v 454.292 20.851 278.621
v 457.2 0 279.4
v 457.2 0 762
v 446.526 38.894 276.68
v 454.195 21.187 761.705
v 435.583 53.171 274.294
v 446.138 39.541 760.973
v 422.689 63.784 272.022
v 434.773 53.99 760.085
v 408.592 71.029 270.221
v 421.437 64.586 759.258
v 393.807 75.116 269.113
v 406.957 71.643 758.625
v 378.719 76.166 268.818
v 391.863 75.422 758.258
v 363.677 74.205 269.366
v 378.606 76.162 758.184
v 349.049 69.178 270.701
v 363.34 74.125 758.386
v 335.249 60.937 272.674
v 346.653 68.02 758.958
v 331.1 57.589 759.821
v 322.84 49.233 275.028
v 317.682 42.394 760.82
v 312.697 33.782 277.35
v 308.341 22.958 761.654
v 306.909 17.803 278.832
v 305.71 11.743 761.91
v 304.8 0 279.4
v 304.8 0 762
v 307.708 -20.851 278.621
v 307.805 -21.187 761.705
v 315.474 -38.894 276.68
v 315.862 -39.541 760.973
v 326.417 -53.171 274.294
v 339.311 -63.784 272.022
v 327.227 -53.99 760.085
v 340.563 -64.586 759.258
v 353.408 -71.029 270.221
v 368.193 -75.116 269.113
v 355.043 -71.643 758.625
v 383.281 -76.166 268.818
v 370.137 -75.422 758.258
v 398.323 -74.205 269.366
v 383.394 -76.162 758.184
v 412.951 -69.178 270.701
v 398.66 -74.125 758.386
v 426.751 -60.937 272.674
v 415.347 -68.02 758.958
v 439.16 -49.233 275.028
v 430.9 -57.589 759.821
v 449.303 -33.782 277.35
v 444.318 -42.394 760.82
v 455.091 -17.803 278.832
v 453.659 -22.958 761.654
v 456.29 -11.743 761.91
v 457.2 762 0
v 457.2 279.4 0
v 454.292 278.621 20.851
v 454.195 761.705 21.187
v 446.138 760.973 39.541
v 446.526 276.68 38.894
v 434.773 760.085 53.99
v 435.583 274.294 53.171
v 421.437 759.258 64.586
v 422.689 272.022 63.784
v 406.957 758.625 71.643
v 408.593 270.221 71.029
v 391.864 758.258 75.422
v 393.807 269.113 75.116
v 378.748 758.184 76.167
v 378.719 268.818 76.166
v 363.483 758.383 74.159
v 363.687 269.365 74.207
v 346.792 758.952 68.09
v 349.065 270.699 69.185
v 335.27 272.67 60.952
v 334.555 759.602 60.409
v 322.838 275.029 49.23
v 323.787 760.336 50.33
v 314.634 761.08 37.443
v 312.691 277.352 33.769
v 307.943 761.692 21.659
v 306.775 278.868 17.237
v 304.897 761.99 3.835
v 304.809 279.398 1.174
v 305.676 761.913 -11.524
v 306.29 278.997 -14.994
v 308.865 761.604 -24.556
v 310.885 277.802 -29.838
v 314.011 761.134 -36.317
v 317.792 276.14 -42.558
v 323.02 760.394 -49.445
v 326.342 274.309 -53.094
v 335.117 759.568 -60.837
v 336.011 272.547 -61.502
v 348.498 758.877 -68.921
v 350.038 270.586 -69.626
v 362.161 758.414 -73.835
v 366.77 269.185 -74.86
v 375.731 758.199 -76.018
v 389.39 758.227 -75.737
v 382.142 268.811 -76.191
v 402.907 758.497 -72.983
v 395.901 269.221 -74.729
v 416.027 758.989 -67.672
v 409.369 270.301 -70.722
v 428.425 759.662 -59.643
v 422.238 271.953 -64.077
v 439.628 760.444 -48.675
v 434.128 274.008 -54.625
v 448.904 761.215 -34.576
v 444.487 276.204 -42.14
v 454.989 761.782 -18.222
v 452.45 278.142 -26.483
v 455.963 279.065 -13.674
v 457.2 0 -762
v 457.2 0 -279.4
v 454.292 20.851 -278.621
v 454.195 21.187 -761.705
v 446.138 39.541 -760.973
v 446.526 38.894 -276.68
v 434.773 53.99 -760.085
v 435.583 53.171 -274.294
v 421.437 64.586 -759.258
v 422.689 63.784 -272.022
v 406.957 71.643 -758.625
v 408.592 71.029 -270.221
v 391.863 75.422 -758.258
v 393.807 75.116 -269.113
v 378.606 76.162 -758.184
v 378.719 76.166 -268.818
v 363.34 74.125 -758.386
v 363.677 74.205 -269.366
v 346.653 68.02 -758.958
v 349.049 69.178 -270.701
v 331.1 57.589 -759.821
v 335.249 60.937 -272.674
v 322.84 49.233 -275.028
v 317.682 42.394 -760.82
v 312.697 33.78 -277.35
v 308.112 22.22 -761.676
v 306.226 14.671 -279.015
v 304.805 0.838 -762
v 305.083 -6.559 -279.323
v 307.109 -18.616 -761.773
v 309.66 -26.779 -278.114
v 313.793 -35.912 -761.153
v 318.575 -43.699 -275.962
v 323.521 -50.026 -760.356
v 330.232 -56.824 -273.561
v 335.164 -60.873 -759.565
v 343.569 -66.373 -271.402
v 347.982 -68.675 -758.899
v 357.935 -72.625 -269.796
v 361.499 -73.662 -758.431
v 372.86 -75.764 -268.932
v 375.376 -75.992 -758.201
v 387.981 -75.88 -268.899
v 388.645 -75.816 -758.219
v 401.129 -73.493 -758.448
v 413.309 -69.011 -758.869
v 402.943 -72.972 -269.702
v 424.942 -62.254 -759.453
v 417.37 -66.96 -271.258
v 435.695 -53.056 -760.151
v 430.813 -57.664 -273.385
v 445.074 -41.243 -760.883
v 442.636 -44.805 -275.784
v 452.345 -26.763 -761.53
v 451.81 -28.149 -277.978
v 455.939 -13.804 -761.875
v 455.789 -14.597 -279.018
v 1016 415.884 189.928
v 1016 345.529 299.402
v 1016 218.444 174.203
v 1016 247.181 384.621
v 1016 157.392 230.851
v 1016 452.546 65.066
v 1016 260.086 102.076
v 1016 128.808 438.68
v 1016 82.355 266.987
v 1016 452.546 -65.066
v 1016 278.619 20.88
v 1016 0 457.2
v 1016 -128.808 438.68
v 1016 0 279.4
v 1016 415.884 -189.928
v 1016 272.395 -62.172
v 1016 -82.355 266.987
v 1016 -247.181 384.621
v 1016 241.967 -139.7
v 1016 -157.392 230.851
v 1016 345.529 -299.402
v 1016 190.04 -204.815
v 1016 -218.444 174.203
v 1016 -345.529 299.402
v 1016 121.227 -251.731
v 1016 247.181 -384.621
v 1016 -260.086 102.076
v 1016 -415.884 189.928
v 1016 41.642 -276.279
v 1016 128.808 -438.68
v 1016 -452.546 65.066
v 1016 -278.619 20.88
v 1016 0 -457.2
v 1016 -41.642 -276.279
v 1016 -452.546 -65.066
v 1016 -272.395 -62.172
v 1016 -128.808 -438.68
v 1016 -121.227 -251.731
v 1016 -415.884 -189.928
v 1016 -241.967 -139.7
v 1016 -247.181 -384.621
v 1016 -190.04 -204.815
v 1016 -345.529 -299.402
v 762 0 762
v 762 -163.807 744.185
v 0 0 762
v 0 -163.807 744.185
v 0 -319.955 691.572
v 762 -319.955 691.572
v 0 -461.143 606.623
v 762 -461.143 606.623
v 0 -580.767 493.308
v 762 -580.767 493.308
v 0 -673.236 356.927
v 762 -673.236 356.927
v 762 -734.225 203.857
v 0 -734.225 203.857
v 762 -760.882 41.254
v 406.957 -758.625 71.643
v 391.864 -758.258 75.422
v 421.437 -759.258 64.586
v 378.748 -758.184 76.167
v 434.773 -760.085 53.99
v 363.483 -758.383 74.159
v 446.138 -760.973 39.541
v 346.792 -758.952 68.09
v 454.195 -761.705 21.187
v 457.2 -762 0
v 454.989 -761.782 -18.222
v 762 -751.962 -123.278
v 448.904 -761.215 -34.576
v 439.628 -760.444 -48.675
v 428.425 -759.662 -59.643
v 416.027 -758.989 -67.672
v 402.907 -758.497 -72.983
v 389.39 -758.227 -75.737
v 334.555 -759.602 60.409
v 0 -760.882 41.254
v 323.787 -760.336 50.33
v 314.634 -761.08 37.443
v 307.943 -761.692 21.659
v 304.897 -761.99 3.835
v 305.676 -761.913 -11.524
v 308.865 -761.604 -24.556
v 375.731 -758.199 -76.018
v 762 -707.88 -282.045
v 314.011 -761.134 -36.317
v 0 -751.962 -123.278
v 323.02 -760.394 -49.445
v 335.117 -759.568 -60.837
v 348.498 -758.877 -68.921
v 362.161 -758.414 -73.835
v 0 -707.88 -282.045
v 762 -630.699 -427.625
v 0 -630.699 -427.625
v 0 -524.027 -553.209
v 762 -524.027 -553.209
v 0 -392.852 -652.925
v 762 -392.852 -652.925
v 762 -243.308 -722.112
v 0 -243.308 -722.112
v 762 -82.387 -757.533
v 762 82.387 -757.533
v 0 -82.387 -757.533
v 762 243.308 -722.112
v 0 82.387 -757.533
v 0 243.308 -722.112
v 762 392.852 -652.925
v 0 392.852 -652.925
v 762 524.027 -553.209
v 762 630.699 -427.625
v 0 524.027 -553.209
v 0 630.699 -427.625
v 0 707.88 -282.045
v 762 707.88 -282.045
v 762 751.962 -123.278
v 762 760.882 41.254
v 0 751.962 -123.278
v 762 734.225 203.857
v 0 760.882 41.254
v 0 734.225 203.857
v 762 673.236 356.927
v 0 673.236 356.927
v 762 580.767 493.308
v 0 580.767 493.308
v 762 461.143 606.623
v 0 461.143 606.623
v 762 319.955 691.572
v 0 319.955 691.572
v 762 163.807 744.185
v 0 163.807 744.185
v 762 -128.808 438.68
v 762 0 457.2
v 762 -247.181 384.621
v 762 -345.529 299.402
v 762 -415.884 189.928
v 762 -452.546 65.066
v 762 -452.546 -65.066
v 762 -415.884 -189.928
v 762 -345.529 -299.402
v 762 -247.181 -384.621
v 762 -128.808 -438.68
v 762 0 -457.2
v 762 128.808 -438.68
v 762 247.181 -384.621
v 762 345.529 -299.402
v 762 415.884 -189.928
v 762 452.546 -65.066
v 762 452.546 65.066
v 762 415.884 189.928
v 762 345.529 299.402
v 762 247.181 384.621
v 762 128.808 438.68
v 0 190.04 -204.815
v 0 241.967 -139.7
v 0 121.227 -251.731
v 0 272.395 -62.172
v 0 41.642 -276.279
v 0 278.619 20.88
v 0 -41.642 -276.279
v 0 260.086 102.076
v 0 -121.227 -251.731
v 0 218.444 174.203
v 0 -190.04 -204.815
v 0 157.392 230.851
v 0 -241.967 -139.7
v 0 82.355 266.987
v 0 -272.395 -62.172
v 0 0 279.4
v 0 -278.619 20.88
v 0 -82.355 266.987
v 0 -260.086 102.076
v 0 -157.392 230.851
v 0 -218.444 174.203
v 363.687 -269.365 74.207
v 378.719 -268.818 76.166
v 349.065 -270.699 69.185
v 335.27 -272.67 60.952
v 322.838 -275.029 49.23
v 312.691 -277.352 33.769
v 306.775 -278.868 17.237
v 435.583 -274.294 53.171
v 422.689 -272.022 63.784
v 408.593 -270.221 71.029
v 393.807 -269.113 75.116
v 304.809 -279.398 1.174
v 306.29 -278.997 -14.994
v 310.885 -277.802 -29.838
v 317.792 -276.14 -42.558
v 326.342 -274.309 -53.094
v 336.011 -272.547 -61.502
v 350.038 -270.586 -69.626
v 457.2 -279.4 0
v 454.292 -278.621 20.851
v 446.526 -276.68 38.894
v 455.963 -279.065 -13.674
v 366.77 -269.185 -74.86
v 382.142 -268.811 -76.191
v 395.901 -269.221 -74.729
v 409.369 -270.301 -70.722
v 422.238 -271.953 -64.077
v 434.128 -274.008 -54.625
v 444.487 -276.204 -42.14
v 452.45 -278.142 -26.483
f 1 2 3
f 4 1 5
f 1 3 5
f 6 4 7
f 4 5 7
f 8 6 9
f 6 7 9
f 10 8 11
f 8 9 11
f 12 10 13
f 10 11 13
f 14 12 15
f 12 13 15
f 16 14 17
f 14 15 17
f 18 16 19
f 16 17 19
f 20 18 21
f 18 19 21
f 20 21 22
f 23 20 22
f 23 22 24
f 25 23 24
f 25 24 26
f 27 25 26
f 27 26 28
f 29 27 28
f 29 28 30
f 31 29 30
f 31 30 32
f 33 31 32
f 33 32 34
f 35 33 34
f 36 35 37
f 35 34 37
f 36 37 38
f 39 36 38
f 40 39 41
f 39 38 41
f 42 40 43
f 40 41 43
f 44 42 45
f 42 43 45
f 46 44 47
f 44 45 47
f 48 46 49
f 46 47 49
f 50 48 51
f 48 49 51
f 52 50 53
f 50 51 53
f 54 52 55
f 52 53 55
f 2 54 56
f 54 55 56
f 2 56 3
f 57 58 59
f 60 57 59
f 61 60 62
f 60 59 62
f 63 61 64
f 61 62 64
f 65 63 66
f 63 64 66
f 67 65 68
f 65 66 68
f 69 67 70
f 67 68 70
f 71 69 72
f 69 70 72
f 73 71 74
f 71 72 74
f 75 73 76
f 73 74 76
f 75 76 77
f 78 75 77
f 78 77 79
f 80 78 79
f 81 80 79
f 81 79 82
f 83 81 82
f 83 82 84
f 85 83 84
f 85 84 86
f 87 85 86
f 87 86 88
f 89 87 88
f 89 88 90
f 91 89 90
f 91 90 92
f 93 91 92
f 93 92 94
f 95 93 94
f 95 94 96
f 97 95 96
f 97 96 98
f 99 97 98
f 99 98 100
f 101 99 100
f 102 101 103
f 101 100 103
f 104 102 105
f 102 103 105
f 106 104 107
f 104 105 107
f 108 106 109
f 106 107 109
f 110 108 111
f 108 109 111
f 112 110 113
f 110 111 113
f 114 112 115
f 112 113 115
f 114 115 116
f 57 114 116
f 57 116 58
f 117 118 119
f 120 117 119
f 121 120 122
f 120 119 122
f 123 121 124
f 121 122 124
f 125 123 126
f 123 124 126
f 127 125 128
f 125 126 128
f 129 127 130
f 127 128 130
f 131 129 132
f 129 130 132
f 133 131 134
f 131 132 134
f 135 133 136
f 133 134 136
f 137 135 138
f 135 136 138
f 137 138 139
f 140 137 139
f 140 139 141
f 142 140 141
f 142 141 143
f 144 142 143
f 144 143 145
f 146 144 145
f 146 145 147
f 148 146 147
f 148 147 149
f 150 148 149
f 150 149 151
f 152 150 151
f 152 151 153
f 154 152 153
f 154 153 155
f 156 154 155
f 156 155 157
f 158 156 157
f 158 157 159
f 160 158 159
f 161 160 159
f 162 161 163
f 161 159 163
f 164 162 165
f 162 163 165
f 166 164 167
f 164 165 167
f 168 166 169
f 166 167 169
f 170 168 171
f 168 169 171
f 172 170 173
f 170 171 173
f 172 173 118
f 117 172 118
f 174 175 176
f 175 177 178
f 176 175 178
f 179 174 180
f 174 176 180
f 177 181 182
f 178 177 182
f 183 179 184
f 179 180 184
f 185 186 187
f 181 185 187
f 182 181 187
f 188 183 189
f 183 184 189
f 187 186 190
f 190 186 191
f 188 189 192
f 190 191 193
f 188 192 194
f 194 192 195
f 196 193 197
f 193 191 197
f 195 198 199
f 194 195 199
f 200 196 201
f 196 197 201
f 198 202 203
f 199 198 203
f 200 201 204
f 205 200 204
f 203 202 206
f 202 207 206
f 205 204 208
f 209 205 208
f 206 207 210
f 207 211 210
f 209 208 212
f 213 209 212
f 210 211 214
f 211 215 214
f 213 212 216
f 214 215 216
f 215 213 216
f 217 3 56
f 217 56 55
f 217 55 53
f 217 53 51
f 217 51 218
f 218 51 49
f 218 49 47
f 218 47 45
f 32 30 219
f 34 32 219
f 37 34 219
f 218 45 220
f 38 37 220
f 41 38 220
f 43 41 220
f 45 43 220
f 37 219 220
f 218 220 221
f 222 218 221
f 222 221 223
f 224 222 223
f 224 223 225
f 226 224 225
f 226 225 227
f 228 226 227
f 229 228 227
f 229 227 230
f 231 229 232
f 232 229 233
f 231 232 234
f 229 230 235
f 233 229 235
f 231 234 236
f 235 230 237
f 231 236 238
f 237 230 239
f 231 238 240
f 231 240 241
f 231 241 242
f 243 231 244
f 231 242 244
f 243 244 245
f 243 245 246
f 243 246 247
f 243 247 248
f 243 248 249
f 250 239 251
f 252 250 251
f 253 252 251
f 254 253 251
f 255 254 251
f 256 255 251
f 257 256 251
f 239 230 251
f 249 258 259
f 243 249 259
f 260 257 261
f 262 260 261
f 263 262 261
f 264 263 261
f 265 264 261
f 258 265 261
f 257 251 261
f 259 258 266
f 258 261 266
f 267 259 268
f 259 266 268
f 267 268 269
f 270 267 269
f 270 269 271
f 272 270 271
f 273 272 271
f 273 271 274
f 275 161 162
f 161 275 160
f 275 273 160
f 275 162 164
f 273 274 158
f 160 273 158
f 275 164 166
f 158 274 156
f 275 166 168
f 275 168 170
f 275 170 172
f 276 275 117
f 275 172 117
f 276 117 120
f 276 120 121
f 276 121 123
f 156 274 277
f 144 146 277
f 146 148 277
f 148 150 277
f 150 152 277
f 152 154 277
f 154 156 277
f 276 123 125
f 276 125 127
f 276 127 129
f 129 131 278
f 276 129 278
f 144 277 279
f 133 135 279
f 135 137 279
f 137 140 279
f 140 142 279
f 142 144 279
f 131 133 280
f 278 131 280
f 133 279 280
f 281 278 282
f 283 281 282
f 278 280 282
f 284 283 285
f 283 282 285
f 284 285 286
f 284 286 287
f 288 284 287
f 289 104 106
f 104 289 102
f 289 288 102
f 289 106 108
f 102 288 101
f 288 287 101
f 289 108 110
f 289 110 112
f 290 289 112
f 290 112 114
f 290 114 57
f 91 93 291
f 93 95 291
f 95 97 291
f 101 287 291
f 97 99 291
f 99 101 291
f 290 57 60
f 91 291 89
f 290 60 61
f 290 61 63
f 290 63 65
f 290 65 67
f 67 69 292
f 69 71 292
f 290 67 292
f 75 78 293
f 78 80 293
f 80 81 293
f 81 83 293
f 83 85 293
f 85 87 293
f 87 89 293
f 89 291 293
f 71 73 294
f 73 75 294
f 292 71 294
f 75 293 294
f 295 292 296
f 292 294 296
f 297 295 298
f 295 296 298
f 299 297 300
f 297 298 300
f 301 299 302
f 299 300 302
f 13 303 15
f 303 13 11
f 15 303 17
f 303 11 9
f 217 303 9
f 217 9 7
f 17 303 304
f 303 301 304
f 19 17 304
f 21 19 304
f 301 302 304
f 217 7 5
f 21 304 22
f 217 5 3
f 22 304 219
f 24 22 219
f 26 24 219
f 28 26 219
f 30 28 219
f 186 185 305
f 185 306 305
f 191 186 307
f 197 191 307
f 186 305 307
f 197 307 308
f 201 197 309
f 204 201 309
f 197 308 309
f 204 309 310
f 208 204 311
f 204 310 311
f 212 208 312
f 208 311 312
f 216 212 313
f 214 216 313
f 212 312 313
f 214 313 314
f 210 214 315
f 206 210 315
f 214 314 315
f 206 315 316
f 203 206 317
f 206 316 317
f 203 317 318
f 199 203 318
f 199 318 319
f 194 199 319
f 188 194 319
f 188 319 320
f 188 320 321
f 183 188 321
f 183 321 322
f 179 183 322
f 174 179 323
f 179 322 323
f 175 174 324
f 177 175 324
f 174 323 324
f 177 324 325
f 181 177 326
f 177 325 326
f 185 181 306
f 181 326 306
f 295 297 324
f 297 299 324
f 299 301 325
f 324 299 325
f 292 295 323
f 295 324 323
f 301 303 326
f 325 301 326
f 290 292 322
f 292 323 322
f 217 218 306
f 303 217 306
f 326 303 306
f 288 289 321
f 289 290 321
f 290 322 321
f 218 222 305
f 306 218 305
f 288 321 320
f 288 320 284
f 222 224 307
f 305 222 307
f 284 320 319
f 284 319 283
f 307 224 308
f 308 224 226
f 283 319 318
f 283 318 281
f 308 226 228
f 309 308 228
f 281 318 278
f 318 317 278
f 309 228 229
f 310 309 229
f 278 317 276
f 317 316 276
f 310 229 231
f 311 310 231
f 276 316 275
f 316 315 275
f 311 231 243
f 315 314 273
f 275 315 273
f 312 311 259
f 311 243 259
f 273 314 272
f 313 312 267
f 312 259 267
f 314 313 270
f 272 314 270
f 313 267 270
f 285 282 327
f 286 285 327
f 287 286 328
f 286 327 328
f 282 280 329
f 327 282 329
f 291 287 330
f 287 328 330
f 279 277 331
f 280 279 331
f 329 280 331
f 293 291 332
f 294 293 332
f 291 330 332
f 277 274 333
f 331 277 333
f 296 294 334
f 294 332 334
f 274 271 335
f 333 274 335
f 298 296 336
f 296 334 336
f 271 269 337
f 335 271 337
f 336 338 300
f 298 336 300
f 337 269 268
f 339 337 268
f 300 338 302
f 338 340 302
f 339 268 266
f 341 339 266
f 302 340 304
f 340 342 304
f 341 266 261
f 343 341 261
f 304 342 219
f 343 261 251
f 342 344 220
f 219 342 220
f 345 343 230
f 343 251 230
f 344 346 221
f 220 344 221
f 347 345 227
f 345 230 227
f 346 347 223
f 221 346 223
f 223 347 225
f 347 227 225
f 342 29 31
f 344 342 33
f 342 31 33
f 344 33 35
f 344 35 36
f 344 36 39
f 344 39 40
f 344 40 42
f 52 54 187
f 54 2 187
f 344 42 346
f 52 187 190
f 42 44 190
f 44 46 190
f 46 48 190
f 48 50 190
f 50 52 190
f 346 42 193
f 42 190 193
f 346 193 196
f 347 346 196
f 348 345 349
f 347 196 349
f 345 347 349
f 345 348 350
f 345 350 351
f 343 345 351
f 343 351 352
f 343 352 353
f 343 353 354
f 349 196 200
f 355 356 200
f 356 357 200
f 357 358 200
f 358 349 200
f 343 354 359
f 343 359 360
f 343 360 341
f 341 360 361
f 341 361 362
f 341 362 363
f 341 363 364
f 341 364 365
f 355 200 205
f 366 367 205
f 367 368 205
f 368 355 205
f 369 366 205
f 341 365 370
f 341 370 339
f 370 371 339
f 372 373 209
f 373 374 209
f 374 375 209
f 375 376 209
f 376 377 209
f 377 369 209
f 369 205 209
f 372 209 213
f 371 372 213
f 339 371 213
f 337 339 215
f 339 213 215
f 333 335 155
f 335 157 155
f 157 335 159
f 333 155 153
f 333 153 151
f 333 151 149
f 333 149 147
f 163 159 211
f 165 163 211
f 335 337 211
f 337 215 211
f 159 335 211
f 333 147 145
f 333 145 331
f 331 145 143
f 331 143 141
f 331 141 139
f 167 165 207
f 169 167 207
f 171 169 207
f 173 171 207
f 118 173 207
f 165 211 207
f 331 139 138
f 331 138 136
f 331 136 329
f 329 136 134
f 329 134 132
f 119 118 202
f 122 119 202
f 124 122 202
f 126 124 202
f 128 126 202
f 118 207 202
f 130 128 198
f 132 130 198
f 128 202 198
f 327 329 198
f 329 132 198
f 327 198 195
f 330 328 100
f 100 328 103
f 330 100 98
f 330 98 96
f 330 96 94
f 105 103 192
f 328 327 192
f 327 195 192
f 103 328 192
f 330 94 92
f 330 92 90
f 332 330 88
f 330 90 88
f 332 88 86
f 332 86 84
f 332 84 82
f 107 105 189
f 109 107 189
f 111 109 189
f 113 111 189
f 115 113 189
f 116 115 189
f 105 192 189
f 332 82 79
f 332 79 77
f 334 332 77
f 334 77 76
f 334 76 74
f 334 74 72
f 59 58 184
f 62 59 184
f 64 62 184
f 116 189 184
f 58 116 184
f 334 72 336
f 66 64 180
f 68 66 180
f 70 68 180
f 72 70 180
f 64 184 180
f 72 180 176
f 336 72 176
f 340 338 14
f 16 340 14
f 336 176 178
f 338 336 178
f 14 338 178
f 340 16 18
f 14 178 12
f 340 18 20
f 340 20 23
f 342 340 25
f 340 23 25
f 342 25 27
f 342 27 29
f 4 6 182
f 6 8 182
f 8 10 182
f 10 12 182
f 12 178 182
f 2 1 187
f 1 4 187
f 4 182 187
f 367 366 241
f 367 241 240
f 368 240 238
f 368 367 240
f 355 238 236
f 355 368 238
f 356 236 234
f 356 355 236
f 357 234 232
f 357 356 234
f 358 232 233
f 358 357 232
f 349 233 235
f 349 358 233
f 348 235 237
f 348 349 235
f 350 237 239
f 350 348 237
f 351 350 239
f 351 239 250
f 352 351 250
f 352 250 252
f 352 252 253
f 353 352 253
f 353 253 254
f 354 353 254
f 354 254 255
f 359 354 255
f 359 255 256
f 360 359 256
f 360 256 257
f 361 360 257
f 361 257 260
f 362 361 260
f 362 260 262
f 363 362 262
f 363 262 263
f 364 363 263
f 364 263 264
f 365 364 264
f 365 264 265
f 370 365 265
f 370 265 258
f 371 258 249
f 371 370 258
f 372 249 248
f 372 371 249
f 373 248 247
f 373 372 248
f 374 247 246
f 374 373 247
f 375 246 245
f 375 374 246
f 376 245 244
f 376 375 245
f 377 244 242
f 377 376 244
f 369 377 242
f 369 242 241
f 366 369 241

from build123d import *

# Parameters (mm, degrees)
F3_R          = 76.2
F4_DEPTH      = 2540
F5_R          = 76.2
F6_DEPTH      = 762.001
F6_DEPTH_BACK = 922.02


with BuildPart() as f1:
    # F0 (on Front) → F1 (revolve)
    with BuildSketch(Plane.XZ):
        Polygon((762, 762), (0, 762), (0, 279.4), (1016, 279.4), (1016, 457.2), (762, 457.2), align=None)
    revolve(axis=Axis((606.499875, 0, 0), (1, 0, 0)))

    # F3 (on offset) → F4 (cut)
    with BuildSketch(Plane.XY.offset(1524)):
        with Locations((381, 0)):
            Circle(F3_R)
    extrude(amount=-F4_DEPTH, mode=Mode.SUBTRACT)

    # F5 (on Front) → F6 (cut, two sides)
    with BuildSketch(Plane.XZ) as f6_sk:
        with Locations((381, 0)):
            Circle(F5_R)
    extrude(amount=F6_DEPTH, mode=Mode.SUBTRACT)
    extrude(f6_sk.sketch, amount=-F6_DEPTH_BACK, mode=Mode.SUBTRACT)


solid = f1.part
